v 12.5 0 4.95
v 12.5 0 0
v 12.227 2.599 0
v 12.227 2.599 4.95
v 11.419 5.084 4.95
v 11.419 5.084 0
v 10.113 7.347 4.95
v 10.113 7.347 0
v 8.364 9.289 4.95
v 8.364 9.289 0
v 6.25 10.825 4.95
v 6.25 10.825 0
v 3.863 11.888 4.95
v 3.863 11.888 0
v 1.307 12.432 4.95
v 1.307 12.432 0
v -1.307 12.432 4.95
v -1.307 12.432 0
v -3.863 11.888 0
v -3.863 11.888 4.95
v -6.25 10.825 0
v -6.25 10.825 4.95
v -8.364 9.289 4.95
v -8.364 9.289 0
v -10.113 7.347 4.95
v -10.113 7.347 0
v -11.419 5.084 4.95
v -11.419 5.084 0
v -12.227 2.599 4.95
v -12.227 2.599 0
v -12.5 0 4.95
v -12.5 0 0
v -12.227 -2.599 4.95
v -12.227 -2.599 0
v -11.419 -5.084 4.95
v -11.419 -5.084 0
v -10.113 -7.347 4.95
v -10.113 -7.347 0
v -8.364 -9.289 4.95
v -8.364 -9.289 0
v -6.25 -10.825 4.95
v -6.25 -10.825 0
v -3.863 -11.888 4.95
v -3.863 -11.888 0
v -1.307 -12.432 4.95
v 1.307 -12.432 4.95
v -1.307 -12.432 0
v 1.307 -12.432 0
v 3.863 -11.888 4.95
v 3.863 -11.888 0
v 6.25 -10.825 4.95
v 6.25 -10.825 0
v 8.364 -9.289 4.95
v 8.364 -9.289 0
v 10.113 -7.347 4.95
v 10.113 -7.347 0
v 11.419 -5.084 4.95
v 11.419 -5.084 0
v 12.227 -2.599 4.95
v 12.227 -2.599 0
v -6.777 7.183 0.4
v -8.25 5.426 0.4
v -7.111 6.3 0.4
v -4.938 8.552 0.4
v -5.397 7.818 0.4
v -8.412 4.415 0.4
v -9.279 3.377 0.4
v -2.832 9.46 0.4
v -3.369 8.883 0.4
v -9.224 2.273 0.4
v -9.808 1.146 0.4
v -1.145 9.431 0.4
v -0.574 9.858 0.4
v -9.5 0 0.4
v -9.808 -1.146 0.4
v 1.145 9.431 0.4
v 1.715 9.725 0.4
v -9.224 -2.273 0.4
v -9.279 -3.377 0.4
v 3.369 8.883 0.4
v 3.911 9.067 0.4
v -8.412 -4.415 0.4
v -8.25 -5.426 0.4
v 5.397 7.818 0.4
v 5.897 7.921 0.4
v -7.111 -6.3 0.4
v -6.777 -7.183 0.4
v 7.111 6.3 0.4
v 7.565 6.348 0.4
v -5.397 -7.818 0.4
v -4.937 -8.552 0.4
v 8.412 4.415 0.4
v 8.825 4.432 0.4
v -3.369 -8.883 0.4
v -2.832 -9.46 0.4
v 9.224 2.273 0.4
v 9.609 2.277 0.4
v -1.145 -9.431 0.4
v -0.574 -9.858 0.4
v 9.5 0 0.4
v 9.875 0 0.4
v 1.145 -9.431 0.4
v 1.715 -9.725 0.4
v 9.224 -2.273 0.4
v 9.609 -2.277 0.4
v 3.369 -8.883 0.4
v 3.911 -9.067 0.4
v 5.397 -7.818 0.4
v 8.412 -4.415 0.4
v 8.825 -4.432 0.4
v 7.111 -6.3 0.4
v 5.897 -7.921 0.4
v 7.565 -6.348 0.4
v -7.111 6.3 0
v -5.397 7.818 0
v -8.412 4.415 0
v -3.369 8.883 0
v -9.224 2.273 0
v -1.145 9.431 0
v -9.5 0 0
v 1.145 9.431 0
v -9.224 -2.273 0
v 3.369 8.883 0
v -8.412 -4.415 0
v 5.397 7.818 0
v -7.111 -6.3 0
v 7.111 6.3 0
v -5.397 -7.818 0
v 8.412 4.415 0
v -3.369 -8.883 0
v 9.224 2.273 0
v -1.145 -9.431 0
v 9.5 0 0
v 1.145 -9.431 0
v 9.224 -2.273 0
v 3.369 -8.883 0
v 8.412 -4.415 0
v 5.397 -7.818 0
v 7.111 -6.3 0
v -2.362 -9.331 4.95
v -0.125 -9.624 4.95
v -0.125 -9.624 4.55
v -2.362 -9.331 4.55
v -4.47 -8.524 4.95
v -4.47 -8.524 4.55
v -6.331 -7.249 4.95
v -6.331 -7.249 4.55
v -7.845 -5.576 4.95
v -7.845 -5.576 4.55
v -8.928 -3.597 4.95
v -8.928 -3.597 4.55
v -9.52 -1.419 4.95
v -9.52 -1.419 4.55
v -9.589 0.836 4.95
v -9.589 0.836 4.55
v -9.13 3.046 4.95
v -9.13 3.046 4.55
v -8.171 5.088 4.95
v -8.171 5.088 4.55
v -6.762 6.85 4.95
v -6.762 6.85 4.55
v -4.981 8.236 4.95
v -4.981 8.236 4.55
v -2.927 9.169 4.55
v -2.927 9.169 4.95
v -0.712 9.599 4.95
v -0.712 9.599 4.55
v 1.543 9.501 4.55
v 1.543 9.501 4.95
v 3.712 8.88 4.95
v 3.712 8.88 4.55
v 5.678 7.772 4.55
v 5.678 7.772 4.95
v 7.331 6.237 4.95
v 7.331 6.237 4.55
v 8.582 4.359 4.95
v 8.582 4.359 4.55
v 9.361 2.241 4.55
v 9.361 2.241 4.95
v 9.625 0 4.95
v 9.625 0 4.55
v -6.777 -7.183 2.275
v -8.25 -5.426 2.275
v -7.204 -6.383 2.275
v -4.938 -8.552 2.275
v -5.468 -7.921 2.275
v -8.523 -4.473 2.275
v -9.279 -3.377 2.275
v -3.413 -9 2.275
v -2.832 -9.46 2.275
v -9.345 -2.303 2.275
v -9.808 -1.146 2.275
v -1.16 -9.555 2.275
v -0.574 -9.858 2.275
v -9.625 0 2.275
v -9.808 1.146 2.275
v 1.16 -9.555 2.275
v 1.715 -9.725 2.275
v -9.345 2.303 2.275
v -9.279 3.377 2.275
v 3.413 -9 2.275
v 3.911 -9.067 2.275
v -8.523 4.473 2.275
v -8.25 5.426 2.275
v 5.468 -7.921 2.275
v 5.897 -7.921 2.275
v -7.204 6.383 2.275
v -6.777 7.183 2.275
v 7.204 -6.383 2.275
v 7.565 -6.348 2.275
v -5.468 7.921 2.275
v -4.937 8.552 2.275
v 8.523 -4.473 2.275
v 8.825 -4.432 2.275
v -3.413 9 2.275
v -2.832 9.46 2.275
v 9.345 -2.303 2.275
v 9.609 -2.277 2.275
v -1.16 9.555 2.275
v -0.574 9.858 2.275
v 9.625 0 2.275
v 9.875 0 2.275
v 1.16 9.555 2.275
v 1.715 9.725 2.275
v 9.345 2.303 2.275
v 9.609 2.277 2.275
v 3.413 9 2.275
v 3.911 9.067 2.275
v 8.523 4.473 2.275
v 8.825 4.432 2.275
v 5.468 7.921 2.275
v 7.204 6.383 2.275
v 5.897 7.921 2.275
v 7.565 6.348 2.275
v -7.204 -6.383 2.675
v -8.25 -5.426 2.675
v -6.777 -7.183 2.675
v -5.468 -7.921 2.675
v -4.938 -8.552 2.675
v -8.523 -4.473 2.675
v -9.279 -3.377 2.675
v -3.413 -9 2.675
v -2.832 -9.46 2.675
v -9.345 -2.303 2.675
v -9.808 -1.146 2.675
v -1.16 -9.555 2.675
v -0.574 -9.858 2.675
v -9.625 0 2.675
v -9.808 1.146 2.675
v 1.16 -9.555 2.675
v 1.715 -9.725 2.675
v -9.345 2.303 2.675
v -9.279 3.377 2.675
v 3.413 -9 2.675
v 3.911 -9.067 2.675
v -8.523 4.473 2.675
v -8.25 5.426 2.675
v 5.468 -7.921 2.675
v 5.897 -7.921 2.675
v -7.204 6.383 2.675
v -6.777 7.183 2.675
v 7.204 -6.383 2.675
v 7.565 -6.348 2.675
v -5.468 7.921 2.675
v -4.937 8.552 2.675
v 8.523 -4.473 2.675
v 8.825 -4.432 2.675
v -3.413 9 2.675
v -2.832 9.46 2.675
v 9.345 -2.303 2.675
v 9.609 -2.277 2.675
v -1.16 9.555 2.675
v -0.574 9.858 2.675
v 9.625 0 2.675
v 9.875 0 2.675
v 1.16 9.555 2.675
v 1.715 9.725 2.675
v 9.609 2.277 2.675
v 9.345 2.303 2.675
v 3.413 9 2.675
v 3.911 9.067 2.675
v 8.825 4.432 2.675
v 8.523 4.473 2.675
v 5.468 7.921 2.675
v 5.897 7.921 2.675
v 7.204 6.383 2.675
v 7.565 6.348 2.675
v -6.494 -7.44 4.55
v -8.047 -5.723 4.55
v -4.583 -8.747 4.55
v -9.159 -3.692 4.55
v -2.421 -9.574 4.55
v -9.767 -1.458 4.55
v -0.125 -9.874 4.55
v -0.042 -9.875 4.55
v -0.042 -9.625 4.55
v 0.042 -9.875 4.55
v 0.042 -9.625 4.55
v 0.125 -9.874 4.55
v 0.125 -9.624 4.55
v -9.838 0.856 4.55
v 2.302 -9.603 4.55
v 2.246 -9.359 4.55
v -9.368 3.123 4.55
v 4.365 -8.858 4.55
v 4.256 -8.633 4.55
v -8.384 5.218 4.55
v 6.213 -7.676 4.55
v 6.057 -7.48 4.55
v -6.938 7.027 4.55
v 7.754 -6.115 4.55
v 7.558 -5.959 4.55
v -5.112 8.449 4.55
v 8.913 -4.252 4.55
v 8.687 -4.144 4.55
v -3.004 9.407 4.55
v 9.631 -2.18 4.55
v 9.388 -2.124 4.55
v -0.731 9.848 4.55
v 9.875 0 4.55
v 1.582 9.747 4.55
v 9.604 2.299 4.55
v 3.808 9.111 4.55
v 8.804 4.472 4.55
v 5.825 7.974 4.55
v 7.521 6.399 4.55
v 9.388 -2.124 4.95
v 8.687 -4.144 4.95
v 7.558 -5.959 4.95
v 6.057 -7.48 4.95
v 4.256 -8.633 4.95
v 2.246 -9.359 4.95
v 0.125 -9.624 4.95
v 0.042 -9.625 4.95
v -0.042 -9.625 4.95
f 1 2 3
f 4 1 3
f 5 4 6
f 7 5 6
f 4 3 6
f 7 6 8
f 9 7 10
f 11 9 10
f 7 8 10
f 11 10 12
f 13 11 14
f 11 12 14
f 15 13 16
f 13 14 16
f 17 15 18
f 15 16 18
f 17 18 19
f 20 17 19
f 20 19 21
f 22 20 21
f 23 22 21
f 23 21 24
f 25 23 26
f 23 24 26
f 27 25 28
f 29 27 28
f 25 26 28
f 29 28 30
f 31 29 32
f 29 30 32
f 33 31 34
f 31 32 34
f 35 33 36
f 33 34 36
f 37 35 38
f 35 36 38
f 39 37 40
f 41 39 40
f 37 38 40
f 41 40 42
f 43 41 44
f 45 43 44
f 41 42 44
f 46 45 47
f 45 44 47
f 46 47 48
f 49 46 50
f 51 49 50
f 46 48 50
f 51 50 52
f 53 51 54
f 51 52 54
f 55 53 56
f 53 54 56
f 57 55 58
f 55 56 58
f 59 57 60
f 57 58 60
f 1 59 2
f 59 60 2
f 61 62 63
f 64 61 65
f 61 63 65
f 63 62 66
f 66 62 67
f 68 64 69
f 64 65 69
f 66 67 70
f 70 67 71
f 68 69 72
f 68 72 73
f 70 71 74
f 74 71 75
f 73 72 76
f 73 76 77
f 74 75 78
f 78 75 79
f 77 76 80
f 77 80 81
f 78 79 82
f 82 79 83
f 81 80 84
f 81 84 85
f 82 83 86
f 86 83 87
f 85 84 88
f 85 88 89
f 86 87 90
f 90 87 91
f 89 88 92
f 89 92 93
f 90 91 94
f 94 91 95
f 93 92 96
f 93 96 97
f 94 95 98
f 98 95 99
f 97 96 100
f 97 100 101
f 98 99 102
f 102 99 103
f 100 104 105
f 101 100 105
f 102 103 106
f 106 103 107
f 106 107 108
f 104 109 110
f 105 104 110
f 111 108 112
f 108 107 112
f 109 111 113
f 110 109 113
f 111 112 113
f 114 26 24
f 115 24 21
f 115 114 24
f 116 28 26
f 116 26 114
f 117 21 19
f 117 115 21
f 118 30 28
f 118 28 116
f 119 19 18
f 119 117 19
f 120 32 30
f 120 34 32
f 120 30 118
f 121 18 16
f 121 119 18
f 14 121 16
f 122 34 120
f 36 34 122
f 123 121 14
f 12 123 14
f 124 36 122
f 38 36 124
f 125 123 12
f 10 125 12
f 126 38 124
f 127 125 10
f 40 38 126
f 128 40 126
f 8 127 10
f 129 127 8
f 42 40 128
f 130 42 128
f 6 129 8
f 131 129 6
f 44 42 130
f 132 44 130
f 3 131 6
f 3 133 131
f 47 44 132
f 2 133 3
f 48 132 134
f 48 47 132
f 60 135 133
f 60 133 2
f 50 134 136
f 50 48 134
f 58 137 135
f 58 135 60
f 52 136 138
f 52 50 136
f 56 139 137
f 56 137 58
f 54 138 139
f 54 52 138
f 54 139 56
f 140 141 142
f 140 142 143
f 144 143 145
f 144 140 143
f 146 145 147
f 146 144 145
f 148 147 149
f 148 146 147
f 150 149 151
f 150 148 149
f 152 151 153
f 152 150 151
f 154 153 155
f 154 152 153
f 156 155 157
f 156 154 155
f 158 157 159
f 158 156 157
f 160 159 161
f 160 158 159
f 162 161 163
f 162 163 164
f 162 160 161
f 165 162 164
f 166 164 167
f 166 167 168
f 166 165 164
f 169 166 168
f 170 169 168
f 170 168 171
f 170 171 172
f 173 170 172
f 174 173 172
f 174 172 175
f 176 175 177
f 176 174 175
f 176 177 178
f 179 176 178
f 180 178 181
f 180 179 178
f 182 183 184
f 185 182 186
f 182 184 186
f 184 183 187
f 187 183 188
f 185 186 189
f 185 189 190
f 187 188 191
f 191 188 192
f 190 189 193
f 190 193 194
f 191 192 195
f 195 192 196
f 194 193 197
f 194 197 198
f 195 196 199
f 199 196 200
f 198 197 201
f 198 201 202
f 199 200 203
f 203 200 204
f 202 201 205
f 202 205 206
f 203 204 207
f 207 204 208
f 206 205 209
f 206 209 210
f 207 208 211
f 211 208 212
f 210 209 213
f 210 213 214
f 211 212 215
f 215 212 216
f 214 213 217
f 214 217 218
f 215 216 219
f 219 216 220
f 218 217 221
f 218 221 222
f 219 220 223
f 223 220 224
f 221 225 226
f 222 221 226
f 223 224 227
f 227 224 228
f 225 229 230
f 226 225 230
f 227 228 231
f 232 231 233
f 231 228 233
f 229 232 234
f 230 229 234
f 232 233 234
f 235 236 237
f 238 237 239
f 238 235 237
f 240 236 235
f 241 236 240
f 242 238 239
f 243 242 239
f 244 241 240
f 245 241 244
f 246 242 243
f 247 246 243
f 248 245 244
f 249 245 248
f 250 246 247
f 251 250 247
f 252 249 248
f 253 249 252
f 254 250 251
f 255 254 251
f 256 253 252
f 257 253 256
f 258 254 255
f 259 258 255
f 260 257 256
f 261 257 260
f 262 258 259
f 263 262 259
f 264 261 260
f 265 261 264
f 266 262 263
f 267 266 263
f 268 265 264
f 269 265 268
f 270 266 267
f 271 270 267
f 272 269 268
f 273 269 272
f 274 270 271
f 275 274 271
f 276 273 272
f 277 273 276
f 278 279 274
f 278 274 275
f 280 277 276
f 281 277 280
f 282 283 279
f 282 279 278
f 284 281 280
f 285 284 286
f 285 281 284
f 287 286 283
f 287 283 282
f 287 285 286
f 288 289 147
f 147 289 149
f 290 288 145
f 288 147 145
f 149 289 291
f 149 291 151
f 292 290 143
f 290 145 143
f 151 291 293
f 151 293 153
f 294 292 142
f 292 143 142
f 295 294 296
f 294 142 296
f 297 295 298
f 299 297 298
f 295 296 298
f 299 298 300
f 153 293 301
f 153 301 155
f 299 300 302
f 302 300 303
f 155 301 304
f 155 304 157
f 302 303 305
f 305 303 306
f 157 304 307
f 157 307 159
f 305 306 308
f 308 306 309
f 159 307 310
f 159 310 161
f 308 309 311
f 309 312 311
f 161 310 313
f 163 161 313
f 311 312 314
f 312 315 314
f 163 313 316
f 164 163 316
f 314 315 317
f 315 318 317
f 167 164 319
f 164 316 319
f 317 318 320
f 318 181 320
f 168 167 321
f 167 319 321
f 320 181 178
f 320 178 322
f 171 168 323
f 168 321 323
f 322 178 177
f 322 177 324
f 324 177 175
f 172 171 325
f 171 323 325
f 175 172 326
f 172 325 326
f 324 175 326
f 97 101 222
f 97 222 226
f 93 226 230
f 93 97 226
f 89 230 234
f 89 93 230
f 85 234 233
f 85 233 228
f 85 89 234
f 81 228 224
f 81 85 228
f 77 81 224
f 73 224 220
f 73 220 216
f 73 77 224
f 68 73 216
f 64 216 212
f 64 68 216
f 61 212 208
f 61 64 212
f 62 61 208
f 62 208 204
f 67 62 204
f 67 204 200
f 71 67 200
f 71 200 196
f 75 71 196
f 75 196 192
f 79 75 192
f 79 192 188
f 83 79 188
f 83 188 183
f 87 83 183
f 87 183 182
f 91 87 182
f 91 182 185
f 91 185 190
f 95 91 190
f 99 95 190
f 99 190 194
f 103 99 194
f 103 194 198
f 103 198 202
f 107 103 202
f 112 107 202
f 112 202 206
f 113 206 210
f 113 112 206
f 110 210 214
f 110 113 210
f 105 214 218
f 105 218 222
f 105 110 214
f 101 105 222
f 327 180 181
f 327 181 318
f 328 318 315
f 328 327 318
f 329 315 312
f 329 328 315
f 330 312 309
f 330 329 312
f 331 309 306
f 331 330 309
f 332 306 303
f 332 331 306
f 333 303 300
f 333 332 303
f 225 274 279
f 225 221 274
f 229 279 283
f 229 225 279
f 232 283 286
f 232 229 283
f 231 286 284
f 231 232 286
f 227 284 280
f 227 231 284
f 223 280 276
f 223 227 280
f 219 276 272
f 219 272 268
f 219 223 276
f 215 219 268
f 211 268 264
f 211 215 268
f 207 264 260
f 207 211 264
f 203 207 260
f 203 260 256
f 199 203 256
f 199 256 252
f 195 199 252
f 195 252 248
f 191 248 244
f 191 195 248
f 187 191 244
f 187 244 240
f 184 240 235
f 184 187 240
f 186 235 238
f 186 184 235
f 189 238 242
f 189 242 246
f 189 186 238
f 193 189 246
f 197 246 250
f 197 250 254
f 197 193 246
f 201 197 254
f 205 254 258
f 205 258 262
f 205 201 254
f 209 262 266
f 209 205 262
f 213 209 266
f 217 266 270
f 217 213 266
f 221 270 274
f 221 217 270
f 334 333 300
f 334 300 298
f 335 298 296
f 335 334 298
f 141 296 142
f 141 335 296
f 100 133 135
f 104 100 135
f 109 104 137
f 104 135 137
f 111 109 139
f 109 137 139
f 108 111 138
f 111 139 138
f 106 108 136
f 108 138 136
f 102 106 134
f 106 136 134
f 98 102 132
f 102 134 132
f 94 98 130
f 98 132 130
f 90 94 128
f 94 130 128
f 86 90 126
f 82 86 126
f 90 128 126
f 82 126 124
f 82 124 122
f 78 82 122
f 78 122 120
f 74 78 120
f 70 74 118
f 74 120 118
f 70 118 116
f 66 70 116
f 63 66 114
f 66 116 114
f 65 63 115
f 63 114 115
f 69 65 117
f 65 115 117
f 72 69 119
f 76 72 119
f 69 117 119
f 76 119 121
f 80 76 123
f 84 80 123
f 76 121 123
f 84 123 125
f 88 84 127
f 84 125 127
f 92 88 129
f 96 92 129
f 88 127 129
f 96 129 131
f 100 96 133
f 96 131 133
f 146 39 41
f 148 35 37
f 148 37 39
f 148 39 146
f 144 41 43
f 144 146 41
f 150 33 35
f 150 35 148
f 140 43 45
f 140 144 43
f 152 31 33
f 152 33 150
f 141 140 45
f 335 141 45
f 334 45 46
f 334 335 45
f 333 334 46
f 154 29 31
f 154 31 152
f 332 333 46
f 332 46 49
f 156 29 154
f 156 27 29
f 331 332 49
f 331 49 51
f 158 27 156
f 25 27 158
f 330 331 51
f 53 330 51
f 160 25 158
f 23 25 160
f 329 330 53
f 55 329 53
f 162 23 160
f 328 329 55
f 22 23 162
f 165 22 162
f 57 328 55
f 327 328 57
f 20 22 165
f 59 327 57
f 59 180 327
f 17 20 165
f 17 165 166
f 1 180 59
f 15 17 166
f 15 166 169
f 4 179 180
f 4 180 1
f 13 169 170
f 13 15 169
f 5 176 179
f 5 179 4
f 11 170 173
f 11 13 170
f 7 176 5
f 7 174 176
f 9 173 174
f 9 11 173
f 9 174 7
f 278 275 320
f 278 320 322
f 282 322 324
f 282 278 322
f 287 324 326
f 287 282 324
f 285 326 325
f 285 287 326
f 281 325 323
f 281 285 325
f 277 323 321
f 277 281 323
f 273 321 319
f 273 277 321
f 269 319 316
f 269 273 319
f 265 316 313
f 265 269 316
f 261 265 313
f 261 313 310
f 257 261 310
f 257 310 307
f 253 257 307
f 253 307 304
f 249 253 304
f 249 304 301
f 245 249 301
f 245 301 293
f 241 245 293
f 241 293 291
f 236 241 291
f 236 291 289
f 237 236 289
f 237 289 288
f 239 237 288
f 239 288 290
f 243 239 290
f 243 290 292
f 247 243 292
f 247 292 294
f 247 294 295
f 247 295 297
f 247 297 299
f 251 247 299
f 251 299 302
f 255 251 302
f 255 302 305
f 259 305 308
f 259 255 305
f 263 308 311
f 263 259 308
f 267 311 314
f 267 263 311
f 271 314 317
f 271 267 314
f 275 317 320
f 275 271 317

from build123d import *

# Parameters (mm, degrees)
F0_R      = 12.5
F0_R_2    = 9.875
F1_DEPTH  = 4.95
F3_R      = 9.875
F3_R_2    = 9.625
F4_DEPTH  = 0.2
F6_R      = 9.875
F6_R_2    = 9.5
F7_DEPTH  = 0.4
F10_DEPTH = 0.4


with BuildPart() as f1:
    # F0 (on Top) → F1 (new body)
    with BuildSketch(Plane.XY):
        Circle(F0_R)
        Circle(F0_R_2, mode=Mode.SUBTRACT)
    extrude(amount=F1_DEPTH)

    # F3 (on offset) → F4 (join, symmetric)
    with BuildSketch(Plane.XY.offset(2.475)):
        Circle(F3_R)
        Circle(F3_R_2, mode=Mode.SUBTRACT)
    extrude(amount=F4_DEPTH, both=True)

    # F6 (on offset) → F7 (join)
    with BuildSketch(Plane(origin=(0, 0, 0), x_dir=(1, 0, 0), z_dir=(0, 0, -1))):
        Circle(F6_R)
        Circle(F6_R_2, mode=Mode.SUBTRACT)
    extrude(amount=-F7_DEPTH)

    # F9 (on offset) → F10 (join)
    with BuildSketch(Plane.XY.offset(4.95)):
        with BuildLine():
            ThreePointArc((0.125, -9.6241882775), (0, -9.625), (-0.125, -9.6241882775))
            Line((-0.125, -9.6241882775), (-0.125, -9.8742088291))
            ThreePointArc((-0.125, -9.8742088291), (0, -9.875), (0.125, -9.8742088291))
            Line((0.125, -9.8742088291), (0.125, -9.6241882775))
        make_face()
        with BuildLine():
            ThreePointArc((-0.125, -9.6241882775), (-6.7615641681, 6.8499543794), (9.625, 0))
            ThreePointArc((9.625, 0), (6.8499543794, -6.7615641681), (0.125, -9.6241882775))
            Line((0.125, -9.6241882775), (0.125, -9.8742088291))
            ThreePointArc((0.125, -9.8742088291), (7.0267346613, -6.9383445432), (9.875, 0))
            ThreePointArc((9.875, 0), (-6.9383445432, 7.0267346613), (-0.125, -9.8742088291))
            Line((-0.125, -9.8742088291), (-0.125, -9.6241882775))
        make_face()
    extrude(amount=-F10_DEPTH)


solid = f1.part
